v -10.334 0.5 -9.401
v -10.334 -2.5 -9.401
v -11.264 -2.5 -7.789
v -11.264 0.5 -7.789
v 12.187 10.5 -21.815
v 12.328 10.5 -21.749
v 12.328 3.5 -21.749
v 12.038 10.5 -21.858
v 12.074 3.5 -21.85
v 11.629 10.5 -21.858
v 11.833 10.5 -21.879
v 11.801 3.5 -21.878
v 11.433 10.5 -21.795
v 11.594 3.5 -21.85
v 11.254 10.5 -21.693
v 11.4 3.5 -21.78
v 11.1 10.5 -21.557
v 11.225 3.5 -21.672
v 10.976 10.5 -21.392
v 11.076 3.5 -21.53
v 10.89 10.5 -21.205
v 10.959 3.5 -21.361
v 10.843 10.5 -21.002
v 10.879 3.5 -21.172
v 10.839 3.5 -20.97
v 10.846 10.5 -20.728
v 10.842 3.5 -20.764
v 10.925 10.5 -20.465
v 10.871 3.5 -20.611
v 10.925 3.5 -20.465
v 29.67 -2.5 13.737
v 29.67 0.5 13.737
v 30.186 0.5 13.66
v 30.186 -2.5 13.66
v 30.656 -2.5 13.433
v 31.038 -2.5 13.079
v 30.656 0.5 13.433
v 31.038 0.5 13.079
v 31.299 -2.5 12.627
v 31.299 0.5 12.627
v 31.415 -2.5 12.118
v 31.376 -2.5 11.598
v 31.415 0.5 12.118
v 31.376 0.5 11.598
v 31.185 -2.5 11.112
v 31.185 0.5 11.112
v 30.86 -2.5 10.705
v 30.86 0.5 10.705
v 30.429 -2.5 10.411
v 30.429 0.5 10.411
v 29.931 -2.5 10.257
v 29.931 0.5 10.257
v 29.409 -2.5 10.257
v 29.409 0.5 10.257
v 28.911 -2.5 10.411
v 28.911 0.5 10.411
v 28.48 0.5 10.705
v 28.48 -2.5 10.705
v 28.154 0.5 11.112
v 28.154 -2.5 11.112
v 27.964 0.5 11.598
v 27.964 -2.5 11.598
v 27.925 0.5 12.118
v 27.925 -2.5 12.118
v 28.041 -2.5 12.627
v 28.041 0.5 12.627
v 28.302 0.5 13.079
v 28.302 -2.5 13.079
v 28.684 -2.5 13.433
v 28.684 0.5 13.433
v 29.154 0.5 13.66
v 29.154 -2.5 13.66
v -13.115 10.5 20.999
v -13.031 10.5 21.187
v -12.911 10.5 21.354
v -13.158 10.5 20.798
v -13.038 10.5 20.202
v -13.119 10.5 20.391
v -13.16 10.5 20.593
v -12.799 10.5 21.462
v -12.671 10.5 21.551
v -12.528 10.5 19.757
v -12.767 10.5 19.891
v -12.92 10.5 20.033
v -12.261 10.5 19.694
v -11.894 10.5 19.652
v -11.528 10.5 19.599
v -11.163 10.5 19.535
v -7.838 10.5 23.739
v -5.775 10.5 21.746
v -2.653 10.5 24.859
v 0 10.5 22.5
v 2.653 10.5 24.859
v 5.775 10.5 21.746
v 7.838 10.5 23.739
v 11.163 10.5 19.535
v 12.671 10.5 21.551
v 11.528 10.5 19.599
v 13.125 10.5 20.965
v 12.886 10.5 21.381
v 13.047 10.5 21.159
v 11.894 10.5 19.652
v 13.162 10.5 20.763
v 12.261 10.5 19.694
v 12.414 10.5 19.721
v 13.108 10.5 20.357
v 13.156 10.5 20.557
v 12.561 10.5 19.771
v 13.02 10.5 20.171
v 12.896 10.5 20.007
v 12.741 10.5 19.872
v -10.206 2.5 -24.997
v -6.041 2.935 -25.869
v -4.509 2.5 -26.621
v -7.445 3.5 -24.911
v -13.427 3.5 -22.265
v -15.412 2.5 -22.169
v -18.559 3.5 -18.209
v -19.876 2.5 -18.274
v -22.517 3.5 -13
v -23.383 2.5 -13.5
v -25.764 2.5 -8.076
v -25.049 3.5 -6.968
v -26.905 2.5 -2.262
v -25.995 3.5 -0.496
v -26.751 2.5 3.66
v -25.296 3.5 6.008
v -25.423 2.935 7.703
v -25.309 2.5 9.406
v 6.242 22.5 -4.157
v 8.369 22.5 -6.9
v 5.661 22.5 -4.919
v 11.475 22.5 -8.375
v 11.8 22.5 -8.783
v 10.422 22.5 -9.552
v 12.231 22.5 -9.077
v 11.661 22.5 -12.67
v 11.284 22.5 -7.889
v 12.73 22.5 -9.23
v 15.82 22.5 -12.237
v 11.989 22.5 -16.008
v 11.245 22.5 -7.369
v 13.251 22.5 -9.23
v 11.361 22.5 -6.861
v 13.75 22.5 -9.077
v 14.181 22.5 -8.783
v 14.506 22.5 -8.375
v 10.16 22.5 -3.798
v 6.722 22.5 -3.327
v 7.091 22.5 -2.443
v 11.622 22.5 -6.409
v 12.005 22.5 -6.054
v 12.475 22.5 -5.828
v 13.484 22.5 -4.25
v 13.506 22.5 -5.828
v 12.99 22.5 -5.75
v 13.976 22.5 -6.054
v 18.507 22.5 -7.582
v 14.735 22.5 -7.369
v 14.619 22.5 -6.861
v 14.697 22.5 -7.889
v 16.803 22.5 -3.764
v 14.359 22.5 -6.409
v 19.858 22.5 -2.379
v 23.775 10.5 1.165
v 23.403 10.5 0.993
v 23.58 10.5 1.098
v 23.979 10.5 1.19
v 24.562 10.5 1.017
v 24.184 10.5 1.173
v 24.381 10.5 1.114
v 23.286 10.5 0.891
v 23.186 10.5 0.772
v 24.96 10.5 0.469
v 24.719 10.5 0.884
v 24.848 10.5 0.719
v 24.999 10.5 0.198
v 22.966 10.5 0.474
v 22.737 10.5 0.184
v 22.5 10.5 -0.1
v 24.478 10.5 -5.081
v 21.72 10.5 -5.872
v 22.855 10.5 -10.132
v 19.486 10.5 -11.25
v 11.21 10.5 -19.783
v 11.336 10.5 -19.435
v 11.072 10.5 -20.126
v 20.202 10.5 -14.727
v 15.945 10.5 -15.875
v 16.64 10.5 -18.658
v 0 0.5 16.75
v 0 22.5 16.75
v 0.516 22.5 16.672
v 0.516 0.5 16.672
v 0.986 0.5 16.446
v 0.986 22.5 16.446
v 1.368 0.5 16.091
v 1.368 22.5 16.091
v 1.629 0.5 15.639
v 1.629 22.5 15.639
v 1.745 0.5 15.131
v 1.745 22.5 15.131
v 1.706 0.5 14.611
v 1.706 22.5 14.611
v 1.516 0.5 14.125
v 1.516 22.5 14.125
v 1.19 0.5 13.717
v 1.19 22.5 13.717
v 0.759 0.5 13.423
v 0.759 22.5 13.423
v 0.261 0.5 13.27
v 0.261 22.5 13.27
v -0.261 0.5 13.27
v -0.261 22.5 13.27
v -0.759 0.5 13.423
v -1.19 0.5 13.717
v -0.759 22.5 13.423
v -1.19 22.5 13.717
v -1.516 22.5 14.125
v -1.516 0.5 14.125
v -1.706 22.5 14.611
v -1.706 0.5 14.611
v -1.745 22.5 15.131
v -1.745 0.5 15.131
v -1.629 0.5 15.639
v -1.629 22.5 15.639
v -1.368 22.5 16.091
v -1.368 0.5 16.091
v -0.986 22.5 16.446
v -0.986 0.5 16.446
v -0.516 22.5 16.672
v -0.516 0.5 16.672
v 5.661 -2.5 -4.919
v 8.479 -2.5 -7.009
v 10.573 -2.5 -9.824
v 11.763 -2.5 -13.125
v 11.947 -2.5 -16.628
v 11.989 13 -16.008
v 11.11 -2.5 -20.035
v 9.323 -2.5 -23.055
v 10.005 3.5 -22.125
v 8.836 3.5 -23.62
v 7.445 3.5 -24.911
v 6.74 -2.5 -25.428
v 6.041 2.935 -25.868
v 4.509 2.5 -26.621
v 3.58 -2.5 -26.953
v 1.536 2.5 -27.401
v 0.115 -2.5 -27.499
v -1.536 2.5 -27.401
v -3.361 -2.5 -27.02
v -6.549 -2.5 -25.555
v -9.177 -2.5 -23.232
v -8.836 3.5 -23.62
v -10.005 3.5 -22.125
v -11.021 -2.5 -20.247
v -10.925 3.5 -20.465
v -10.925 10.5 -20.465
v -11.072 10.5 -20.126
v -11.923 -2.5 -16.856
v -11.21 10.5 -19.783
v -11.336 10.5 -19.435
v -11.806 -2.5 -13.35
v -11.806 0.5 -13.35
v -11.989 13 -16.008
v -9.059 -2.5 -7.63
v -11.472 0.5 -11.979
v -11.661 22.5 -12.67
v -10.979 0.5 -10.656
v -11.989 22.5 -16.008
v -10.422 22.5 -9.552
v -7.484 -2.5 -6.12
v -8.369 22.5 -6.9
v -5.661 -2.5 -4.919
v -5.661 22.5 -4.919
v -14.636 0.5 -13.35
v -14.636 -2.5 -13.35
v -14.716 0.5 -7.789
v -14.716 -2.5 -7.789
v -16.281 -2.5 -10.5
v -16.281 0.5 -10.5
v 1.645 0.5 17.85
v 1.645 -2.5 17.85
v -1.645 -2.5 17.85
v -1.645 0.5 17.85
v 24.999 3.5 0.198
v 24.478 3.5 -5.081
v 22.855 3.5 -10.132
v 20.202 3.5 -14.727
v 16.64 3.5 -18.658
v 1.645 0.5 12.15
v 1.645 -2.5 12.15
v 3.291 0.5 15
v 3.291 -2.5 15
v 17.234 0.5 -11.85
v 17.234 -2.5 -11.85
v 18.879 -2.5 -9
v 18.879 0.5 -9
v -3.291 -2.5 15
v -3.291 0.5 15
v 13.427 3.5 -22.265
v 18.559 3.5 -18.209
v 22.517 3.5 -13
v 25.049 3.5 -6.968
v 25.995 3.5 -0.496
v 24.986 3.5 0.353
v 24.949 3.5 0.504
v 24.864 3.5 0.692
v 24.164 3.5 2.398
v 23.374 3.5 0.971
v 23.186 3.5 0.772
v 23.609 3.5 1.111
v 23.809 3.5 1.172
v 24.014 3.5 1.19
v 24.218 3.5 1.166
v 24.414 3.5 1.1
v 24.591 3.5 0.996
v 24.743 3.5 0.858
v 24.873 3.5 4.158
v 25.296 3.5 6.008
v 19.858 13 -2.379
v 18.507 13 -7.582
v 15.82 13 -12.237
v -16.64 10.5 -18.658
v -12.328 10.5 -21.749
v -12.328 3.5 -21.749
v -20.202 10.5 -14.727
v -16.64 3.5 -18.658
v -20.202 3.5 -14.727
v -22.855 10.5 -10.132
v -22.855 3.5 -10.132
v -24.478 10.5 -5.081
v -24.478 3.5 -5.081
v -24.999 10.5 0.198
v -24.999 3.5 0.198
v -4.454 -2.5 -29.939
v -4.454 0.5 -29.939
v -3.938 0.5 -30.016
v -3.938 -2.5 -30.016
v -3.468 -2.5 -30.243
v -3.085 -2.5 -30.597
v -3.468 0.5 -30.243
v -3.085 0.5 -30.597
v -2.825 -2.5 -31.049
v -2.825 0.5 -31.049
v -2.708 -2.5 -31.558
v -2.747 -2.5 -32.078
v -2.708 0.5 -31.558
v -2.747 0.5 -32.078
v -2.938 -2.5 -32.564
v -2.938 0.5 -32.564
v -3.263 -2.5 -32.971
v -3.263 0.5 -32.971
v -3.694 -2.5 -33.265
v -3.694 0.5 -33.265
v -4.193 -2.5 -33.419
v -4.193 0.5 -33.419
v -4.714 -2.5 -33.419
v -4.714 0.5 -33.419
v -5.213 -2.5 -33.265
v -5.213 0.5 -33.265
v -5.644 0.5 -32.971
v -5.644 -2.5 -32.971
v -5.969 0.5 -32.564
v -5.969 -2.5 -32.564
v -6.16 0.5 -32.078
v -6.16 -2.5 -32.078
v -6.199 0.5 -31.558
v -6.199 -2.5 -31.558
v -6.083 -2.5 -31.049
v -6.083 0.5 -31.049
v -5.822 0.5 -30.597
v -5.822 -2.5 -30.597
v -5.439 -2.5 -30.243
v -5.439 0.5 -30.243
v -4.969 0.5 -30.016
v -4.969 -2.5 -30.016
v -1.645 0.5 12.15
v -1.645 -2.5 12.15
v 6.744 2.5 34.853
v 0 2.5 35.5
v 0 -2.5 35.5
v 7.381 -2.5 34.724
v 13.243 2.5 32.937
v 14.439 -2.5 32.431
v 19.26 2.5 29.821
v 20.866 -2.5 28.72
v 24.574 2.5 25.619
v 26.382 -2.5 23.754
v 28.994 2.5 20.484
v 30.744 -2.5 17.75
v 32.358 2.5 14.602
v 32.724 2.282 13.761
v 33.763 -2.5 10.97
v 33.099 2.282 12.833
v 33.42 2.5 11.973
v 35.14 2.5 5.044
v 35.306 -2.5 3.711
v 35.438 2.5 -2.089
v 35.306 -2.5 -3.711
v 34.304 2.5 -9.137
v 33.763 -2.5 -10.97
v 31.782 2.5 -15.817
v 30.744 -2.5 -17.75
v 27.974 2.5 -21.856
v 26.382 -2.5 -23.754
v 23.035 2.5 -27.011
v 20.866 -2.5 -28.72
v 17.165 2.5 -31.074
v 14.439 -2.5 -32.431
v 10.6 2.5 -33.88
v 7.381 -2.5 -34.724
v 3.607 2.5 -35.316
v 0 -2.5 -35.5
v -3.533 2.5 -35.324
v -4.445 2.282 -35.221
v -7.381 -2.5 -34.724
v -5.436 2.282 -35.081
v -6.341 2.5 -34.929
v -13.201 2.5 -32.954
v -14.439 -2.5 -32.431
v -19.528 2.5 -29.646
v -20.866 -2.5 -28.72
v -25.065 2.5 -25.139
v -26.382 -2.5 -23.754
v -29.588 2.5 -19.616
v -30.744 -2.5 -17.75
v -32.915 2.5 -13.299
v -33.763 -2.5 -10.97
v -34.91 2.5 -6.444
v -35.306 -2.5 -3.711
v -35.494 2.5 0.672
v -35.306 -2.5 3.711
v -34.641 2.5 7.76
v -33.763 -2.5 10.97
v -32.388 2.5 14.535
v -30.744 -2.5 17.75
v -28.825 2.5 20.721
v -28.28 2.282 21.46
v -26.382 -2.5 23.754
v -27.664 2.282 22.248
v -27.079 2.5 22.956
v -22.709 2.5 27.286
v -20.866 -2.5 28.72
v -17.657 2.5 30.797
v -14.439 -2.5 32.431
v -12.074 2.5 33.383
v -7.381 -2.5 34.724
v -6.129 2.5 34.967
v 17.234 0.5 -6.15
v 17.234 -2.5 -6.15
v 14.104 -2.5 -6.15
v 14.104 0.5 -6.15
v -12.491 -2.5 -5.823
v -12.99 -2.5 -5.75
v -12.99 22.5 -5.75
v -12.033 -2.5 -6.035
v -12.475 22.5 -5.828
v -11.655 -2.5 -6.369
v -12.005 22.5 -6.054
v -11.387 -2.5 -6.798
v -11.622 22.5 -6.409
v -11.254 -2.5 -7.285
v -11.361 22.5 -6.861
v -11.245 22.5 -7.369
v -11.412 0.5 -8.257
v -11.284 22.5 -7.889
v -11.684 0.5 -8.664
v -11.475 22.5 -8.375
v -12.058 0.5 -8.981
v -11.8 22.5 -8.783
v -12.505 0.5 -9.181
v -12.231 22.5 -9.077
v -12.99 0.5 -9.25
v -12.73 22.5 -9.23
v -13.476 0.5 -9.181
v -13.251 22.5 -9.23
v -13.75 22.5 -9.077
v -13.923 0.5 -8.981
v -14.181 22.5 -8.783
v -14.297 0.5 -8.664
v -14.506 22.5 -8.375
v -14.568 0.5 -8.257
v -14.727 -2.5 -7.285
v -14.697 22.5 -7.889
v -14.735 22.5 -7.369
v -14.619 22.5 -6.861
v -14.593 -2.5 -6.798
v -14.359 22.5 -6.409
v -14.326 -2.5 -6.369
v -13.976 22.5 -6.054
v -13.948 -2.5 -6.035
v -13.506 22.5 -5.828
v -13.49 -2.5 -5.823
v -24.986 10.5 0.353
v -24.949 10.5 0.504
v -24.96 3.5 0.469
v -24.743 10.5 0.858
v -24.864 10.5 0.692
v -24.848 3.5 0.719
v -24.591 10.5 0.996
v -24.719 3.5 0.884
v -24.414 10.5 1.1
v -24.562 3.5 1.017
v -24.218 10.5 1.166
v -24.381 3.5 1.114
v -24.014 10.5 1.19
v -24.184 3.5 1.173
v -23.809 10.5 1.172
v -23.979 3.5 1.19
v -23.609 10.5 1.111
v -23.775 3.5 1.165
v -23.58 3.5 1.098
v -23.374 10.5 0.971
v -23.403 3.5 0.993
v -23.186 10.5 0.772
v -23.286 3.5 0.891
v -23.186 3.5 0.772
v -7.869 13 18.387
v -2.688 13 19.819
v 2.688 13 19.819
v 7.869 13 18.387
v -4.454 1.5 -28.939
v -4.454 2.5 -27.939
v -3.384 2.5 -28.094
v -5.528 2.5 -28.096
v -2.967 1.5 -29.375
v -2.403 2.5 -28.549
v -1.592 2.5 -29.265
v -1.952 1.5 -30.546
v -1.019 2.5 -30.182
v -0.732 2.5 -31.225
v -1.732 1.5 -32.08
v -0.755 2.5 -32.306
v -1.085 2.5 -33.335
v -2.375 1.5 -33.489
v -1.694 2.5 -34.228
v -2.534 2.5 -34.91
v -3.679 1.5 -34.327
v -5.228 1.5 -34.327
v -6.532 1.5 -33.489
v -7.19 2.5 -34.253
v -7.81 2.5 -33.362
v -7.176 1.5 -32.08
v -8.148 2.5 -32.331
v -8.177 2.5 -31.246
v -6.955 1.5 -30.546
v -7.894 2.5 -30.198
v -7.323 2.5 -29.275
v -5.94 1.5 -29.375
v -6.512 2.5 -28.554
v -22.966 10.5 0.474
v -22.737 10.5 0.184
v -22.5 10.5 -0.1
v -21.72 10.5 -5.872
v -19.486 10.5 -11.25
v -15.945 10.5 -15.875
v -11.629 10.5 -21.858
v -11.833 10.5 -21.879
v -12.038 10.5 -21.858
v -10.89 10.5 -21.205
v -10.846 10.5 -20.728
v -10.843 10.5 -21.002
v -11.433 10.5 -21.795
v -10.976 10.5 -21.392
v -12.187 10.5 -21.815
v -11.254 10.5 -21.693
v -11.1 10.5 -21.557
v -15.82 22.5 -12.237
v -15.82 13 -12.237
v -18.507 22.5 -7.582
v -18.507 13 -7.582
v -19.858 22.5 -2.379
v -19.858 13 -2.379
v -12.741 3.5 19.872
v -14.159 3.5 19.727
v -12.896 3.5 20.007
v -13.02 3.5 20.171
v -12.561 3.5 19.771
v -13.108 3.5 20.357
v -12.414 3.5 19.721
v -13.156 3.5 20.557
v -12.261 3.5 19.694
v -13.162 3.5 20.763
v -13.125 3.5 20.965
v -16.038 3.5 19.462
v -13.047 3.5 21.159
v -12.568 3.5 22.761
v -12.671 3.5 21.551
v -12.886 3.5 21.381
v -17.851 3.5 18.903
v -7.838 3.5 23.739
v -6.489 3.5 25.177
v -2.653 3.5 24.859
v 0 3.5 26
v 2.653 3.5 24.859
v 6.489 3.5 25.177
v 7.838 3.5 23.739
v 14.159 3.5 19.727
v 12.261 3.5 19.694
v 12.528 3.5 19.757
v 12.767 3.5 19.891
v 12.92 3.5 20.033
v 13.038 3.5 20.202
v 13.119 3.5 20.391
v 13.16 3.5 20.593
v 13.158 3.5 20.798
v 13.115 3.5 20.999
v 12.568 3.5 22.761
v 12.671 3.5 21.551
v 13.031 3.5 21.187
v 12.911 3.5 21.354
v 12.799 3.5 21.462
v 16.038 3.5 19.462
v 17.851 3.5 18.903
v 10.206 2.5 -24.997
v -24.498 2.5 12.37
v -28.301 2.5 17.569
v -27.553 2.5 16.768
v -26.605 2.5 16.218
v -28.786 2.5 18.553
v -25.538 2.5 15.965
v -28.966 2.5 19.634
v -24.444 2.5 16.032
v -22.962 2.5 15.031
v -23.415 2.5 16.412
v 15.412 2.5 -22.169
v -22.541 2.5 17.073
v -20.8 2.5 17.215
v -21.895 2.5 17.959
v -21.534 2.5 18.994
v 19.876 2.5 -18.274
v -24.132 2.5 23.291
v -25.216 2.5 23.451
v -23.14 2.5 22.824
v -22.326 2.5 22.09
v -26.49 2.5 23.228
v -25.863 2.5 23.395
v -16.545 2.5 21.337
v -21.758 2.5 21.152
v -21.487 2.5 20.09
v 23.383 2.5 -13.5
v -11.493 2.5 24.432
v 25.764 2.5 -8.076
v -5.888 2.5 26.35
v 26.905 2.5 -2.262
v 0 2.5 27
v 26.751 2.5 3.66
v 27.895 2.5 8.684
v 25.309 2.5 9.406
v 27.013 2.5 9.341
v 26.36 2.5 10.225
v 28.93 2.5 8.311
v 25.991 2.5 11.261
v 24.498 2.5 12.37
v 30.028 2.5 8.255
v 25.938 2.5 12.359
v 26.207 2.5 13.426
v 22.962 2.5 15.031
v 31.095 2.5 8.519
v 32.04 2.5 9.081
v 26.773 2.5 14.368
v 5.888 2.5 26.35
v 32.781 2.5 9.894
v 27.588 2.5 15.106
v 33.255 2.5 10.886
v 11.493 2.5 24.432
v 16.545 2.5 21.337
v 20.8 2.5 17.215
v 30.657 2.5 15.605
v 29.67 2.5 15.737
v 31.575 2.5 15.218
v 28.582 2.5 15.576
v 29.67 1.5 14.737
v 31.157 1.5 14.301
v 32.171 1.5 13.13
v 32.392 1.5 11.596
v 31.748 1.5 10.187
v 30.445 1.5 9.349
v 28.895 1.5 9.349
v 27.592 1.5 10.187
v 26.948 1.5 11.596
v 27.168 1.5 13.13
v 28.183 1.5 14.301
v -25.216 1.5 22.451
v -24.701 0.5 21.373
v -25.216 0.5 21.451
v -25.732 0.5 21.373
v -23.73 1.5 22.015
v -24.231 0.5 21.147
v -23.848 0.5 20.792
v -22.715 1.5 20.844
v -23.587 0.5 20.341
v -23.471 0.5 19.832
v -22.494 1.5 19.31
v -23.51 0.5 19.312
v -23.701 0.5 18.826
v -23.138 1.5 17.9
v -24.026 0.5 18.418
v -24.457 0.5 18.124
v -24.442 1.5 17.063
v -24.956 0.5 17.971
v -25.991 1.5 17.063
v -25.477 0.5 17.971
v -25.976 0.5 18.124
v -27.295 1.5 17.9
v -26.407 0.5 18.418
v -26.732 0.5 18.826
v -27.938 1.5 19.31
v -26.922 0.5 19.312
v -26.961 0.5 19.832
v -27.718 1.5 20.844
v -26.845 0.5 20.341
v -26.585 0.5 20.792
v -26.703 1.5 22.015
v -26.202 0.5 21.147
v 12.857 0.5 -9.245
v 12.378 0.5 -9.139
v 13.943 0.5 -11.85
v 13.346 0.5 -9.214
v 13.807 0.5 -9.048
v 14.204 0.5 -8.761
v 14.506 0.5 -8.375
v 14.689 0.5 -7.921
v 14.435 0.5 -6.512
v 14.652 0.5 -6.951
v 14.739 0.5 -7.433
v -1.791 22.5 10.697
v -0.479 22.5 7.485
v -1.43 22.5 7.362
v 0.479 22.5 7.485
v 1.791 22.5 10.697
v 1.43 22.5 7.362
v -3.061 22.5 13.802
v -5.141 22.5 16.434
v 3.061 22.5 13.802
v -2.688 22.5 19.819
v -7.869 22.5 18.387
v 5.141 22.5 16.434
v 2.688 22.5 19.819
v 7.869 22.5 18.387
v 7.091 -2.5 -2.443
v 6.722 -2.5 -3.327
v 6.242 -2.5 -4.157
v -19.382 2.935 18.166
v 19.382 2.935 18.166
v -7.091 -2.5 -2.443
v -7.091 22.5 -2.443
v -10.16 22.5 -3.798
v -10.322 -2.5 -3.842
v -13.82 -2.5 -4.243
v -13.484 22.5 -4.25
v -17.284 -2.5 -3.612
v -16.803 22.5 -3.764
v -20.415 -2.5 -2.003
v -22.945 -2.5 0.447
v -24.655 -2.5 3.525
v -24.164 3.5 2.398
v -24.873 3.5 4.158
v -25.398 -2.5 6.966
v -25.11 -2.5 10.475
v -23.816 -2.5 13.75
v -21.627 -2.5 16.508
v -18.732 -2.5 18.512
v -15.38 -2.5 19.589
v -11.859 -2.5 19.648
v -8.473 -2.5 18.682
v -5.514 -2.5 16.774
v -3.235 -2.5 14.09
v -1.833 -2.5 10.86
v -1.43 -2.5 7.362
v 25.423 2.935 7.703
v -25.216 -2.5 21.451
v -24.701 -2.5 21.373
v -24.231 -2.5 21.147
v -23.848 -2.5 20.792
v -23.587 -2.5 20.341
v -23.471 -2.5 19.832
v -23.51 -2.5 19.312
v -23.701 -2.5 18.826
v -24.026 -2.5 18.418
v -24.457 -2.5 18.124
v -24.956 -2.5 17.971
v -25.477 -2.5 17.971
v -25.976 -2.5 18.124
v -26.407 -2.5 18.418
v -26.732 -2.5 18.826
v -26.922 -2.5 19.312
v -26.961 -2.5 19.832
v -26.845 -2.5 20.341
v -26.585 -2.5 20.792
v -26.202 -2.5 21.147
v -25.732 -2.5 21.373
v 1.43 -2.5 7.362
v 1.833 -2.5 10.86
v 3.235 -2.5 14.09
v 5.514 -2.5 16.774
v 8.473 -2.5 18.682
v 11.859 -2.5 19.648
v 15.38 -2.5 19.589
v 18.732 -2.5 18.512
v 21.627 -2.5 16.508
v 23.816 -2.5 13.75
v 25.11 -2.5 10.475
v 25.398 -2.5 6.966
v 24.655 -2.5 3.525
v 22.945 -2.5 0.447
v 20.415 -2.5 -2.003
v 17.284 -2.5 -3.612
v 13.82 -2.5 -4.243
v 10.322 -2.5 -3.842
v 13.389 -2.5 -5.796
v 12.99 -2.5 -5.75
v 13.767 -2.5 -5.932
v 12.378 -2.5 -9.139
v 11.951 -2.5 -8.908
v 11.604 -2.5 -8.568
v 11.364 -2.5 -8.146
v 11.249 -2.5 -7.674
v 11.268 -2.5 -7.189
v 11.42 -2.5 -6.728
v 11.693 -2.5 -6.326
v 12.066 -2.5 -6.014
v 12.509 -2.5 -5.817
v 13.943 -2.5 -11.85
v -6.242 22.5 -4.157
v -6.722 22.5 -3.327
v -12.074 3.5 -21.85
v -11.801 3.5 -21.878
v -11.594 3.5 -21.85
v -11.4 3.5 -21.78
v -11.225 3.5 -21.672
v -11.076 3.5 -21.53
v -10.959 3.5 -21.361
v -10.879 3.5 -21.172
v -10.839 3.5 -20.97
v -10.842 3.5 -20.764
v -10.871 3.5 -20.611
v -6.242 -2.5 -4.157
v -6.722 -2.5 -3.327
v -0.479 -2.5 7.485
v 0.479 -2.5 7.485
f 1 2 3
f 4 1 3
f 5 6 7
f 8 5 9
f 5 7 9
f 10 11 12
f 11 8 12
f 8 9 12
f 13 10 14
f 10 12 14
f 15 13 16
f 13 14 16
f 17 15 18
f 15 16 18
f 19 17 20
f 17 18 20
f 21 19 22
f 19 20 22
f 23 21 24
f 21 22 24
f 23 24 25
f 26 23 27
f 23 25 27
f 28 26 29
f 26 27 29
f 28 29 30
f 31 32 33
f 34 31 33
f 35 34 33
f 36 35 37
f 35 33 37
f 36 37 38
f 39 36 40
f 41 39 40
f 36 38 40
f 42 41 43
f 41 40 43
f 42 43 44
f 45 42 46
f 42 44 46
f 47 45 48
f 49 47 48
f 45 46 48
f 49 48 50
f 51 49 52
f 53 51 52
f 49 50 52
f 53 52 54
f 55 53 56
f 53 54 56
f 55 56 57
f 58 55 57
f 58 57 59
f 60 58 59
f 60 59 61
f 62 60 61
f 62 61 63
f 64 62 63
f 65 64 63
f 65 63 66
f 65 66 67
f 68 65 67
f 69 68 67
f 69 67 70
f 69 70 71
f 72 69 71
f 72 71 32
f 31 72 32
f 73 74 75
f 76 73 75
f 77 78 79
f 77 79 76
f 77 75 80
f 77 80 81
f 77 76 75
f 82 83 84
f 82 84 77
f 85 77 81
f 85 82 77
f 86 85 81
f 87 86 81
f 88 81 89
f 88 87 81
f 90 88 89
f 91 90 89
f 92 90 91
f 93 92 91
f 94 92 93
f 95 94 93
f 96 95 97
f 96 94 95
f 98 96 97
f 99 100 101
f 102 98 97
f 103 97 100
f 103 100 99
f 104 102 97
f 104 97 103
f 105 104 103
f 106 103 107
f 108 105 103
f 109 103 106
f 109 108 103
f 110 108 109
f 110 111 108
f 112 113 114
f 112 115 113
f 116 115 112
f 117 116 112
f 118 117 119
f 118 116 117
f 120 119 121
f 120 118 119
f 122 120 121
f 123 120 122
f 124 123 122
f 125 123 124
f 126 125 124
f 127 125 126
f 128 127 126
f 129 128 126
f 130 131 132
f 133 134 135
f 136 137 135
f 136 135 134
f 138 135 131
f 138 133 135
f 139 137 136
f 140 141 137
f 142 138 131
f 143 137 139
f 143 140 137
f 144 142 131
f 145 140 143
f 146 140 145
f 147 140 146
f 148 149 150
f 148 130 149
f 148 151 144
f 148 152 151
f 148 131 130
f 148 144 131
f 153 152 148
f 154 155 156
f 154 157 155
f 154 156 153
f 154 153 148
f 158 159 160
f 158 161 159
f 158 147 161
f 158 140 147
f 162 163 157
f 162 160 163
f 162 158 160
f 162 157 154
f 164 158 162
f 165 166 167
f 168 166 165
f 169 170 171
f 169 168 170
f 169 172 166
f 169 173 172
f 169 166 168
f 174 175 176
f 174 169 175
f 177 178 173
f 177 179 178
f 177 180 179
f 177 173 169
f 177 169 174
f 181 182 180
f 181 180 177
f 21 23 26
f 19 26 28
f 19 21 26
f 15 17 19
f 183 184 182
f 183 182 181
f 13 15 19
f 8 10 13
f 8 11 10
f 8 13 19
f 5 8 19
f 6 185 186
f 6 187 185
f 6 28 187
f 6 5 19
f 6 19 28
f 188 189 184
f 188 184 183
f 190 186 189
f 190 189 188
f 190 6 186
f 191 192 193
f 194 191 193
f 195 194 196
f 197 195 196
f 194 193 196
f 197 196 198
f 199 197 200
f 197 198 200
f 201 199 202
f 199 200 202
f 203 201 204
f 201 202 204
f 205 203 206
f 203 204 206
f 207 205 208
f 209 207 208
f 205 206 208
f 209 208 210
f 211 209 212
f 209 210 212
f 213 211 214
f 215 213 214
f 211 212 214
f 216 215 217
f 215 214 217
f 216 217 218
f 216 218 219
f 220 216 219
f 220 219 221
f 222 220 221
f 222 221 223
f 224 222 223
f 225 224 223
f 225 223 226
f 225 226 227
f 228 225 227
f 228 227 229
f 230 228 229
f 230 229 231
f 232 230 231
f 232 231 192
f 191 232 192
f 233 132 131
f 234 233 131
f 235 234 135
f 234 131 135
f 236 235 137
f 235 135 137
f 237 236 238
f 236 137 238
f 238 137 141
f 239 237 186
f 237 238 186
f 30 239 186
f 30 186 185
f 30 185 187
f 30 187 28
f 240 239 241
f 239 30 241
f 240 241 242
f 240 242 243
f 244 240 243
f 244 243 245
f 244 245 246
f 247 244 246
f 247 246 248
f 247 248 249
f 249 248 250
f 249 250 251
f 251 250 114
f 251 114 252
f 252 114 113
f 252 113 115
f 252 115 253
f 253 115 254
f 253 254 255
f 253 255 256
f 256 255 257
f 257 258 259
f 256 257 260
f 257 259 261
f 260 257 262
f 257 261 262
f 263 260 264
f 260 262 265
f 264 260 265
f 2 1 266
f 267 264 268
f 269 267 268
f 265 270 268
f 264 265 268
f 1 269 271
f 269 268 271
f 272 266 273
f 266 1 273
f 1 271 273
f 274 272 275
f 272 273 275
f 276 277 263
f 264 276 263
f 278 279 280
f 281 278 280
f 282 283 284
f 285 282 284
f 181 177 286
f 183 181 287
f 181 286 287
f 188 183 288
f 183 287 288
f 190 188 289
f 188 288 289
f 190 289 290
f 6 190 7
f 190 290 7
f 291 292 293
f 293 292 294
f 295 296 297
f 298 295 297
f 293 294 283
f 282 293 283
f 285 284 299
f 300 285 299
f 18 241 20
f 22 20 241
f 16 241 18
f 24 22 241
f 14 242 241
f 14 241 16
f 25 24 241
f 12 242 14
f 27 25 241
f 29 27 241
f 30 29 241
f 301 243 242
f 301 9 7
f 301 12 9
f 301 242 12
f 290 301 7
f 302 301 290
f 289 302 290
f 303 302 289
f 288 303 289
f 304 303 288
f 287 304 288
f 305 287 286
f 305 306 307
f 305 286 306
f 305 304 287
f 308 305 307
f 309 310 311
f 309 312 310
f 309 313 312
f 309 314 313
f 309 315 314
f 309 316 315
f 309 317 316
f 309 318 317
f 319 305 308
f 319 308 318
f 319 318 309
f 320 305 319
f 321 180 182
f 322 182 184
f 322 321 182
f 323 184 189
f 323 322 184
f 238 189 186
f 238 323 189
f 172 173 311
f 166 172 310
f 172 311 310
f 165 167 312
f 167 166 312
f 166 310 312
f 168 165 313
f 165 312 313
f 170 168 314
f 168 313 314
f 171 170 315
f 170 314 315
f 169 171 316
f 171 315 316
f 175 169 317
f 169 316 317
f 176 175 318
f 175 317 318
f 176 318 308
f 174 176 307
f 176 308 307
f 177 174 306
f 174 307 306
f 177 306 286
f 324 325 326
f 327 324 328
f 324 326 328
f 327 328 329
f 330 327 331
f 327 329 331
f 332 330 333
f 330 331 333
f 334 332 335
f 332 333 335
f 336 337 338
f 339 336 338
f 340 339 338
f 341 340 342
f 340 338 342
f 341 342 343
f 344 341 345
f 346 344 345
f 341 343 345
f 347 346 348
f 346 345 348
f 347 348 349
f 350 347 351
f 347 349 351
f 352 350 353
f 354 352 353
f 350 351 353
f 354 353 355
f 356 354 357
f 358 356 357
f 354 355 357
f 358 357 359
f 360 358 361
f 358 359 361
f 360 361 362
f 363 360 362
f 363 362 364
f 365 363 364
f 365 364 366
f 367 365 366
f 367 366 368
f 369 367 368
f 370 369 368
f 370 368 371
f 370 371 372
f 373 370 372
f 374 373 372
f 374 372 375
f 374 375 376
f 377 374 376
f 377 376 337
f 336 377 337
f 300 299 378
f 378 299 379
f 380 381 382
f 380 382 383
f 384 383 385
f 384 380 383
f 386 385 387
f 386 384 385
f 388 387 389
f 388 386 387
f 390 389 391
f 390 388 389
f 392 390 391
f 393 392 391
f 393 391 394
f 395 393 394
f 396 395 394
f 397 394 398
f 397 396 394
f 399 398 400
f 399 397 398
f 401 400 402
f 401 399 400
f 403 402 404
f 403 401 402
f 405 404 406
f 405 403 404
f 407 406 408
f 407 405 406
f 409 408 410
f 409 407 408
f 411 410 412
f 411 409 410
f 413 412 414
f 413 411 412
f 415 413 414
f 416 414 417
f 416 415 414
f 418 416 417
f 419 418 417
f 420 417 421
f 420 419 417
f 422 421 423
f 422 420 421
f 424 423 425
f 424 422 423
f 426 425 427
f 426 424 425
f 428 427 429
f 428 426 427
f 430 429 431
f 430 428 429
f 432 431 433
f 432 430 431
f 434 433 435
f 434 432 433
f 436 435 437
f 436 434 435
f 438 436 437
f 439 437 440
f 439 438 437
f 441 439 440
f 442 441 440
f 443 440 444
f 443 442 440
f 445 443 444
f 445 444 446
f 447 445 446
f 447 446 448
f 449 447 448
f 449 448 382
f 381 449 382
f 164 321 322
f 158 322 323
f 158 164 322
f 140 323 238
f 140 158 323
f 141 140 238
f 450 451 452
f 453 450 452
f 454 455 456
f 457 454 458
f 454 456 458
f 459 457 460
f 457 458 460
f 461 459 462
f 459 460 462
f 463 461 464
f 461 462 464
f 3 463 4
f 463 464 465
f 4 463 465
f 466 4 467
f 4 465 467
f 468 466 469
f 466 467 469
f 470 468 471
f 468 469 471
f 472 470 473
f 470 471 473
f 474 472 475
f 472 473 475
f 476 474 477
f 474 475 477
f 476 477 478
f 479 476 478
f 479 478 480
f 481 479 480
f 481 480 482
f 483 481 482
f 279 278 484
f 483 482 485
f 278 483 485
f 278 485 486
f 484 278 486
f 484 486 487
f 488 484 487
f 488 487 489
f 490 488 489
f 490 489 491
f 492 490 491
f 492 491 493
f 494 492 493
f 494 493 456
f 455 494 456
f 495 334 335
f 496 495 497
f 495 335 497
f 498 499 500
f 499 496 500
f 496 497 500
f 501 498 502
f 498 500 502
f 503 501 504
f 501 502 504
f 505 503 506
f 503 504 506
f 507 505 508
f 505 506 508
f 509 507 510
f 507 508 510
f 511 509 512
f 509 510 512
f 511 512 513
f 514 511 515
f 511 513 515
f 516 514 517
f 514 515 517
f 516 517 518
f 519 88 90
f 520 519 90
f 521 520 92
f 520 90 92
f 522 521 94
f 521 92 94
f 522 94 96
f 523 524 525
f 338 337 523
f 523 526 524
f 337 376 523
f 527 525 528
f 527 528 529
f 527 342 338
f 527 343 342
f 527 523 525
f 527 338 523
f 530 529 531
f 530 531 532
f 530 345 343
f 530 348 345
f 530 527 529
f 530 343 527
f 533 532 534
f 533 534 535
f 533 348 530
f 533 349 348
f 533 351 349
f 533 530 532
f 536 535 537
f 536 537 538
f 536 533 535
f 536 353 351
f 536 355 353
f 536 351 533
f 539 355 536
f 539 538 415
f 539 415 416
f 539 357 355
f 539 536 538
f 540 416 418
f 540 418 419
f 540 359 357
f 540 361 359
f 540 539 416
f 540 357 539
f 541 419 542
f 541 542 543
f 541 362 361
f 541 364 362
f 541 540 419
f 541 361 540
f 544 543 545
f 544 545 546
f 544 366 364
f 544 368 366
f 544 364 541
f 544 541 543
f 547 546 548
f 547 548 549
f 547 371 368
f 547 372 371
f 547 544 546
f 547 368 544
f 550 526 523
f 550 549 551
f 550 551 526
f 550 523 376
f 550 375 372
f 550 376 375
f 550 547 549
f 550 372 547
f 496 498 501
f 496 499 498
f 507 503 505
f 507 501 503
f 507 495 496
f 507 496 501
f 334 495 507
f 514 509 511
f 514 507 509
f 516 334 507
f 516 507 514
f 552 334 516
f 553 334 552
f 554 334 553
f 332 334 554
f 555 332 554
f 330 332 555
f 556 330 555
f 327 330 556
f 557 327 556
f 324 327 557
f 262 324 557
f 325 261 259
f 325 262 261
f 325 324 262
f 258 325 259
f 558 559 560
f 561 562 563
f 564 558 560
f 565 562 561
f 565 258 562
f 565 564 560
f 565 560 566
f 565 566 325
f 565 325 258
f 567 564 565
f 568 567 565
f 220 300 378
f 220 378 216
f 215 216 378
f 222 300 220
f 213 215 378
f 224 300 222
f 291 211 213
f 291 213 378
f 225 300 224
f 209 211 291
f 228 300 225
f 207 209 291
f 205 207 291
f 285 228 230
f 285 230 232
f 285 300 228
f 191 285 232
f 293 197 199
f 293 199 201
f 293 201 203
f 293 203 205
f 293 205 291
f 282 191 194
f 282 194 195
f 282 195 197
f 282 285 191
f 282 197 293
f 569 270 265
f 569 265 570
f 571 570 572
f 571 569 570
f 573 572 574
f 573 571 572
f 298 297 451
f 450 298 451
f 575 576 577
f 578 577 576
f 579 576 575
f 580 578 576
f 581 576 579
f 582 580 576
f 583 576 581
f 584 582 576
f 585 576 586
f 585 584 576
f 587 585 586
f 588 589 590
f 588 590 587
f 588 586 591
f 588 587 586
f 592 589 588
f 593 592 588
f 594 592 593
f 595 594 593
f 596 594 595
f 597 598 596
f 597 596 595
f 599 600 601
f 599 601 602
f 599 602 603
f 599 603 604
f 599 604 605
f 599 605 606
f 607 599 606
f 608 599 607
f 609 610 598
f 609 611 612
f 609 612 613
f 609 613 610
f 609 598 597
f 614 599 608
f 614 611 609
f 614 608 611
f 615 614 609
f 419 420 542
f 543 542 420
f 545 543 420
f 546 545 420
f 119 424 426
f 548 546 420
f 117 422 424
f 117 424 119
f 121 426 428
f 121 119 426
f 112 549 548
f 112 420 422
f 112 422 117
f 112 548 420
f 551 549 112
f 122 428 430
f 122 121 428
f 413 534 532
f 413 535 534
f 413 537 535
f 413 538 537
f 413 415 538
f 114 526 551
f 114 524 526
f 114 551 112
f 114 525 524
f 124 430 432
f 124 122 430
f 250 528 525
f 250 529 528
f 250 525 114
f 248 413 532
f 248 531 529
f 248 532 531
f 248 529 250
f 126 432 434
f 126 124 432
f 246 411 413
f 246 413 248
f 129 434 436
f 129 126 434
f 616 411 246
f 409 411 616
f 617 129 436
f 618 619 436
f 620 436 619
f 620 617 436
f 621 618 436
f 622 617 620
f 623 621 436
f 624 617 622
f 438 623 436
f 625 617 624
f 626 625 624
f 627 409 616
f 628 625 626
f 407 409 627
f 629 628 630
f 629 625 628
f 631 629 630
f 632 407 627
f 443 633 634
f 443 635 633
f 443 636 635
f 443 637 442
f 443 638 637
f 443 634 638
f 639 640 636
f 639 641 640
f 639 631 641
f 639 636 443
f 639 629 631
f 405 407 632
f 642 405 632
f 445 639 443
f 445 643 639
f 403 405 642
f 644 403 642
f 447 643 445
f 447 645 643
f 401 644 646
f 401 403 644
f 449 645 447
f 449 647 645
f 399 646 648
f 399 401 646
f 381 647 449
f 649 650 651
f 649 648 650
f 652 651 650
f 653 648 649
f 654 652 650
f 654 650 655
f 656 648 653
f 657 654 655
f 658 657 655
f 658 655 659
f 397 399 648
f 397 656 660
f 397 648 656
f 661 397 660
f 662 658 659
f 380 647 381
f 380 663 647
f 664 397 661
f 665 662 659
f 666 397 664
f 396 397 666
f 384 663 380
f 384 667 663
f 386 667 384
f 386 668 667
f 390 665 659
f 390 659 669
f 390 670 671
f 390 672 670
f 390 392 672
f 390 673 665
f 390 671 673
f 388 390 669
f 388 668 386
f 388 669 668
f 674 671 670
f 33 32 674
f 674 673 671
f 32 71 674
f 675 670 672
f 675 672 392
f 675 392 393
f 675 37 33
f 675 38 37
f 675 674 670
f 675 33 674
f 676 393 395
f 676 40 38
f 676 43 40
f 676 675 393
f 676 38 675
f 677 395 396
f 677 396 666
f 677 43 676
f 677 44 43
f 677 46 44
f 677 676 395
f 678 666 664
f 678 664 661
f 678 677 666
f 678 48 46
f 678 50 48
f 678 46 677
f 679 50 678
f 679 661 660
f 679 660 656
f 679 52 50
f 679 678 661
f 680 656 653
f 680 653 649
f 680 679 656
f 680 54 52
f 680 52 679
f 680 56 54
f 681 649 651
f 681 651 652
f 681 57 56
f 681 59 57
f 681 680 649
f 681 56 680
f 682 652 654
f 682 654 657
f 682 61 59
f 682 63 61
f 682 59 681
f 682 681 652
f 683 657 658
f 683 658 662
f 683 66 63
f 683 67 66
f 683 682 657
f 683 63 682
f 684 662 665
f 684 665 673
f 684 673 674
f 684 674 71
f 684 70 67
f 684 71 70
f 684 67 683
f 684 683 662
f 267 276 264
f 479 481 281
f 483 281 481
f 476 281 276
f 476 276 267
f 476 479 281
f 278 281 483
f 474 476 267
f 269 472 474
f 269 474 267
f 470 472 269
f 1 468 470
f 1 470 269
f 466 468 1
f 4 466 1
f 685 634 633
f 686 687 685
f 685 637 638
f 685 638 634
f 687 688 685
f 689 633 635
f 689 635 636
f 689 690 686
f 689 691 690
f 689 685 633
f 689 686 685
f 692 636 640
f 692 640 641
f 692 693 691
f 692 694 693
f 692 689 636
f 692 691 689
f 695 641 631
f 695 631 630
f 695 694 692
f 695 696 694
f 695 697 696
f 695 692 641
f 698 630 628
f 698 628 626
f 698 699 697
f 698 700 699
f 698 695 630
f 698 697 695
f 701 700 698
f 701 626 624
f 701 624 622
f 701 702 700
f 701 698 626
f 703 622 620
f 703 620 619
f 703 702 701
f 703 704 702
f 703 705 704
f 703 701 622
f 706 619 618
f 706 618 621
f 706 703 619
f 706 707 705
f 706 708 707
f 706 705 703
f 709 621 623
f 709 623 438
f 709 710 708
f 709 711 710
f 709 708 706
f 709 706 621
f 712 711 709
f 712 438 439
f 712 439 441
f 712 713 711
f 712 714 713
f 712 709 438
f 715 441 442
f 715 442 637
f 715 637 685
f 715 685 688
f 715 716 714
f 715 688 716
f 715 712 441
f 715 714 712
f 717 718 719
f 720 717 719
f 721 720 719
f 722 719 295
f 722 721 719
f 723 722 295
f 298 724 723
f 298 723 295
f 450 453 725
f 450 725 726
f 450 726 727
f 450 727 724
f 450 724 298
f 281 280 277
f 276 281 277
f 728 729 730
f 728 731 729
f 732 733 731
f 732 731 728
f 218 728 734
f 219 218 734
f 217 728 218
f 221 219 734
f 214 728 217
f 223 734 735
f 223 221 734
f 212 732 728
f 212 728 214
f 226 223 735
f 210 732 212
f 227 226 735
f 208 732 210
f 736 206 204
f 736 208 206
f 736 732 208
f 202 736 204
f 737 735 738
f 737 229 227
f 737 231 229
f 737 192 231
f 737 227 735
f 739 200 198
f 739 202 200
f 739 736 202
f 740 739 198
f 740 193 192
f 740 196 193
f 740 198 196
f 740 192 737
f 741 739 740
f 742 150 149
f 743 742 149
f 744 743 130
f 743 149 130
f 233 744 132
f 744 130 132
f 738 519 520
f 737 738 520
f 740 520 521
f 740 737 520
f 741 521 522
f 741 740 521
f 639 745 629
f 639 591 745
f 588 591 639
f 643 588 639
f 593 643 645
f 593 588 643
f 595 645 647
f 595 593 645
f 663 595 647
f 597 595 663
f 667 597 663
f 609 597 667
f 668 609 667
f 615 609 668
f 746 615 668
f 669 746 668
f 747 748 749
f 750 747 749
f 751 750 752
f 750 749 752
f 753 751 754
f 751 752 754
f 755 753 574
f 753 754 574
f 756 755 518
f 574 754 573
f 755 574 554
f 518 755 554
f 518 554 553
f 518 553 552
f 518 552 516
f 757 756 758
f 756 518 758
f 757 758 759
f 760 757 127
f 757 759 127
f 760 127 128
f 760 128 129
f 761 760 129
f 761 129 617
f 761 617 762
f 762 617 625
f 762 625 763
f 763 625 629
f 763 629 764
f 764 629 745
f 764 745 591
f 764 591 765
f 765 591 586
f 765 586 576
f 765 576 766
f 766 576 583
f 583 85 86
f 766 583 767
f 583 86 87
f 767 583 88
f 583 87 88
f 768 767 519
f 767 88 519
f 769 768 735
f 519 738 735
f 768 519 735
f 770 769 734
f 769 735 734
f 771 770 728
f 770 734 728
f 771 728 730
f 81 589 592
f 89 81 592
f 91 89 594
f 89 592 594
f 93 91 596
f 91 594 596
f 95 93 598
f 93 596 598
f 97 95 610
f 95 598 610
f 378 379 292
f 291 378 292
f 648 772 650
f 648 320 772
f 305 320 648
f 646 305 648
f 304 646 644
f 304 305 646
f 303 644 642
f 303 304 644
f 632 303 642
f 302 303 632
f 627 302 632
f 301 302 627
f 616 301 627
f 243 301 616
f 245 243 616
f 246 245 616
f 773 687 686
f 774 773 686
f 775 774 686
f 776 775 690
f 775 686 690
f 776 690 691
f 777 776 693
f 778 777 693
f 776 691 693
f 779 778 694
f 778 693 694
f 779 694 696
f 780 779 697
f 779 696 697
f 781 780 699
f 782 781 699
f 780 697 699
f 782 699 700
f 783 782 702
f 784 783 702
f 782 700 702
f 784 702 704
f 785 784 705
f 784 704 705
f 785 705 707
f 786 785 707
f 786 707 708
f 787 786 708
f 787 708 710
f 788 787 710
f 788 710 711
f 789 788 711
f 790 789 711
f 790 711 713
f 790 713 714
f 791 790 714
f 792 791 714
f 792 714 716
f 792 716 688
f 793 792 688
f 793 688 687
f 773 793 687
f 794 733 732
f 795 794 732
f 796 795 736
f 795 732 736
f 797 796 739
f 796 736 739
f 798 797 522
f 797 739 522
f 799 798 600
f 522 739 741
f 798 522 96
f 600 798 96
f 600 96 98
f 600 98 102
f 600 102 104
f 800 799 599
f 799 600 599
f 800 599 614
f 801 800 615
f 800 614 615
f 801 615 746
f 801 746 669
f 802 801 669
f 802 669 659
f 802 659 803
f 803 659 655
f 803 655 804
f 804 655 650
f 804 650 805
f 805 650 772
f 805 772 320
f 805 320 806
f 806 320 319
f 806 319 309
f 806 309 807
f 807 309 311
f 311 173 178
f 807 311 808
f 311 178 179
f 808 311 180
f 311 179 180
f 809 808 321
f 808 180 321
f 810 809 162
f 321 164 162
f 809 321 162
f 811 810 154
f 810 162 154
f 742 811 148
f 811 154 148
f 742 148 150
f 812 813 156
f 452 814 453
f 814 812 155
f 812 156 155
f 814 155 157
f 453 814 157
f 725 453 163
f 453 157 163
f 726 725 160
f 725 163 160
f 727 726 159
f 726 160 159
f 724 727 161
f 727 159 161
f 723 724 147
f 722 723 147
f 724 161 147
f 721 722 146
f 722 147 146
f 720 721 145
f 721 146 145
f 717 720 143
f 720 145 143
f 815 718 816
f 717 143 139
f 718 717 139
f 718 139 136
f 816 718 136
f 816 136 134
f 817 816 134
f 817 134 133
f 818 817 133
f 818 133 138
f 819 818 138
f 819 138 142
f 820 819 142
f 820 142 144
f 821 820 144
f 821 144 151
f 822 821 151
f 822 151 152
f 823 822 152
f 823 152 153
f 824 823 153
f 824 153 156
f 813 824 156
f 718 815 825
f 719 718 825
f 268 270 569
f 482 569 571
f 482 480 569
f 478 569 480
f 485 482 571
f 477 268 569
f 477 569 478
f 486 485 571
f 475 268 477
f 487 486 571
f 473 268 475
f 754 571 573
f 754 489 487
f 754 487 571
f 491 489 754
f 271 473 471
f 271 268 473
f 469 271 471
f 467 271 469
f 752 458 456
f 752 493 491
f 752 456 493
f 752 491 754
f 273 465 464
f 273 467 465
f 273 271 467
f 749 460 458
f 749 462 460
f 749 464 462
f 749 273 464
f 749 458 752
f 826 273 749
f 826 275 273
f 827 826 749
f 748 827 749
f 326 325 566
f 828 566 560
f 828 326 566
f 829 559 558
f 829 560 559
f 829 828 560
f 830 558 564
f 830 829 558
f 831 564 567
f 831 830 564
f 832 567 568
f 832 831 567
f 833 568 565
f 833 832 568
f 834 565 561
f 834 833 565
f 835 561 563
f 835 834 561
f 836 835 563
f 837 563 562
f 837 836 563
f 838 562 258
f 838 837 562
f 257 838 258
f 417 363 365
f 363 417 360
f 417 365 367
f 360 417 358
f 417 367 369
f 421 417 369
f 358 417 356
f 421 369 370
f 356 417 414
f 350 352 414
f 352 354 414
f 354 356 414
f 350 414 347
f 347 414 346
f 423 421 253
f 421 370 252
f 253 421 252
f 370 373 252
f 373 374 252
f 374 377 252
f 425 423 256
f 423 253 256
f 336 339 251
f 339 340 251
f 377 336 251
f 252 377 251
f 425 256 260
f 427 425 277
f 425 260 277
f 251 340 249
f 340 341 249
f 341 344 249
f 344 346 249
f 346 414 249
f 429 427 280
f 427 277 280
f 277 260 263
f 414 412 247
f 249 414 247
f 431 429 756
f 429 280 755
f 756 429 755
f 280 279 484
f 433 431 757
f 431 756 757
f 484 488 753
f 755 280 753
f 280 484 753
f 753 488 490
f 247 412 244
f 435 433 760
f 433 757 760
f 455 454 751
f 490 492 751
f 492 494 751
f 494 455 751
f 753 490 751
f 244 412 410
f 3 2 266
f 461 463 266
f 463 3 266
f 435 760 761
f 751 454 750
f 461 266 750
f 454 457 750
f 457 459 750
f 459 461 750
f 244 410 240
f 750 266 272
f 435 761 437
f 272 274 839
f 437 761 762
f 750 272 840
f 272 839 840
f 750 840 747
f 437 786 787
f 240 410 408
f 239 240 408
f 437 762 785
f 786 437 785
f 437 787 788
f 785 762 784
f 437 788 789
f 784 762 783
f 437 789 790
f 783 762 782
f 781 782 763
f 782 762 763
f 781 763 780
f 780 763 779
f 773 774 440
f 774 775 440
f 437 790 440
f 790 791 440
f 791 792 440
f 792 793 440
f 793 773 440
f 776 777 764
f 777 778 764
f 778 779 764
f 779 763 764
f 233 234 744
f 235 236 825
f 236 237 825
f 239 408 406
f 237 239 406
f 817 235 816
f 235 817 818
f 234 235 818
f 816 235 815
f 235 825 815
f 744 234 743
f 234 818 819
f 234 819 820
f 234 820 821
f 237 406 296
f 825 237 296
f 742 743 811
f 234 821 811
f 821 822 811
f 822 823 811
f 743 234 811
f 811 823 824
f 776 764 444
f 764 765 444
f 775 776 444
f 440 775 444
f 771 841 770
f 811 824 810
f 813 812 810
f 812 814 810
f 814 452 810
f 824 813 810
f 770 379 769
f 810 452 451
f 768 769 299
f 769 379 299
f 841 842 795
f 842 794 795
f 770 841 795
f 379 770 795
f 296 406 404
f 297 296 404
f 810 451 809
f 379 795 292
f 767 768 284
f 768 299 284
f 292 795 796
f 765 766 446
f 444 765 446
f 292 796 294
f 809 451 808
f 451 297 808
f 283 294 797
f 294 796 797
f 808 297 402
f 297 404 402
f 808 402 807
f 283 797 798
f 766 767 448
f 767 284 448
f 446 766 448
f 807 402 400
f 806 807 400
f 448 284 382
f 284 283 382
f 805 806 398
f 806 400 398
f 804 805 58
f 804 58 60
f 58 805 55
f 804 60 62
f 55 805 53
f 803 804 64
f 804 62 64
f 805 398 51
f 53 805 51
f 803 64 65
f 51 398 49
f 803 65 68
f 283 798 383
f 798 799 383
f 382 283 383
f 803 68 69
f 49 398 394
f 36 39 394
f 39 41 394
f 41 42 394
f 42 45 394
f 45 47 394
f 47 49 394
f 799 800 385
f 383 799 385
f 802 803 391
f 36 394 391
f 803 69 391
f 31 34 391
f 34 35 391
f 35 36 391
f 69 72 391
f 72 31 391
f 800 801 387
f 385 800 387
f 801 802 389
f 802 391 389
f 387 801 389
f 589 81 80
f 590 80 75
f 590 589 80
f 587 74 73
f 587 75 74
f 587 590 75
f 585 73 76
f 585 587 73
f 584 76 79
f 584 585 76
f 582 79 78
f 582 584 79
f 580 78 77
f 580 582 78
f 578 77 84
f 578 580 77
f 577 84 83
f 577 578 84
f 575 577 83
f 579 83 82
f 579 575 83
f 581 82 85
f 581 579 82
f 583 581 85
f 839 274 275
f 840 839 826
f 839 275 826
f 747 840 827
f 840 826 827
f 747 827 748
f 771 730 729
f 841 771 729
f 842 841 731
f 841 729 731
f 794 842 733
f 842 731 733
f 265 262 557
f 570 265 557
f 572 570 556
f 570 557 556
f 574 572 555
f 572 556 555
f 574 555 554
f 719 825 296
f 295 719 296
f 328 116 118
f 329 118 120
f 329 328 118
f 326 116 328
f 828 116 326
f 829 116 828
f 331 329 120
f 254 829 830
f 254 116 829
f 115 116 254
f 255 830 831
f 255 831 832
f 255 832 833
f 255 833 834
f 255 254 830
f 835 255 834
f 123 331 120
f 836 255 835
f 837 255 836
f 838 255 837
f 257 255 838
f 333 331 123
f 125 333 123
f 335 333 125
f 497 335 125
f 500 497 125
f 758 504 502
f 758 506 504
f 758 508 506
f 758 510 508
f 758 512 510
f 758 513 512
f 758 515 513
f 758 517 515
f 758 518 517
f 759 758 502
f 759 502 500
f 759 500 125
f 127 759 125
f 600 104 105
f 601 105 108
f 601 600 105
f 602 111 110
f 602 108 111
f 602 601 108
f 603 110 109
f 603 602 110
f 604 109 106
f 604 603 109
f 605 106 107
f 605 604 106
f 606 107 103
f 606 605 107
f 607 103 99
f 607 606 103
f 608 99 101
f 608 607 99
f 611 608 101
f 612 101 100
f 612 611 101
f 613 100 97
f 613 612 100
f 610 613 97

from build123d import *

# Parameters (mm, degrees)
SKETCH1_R           = 35.5
BOSS_EXTRUDE1_DEPTH = 2.5
SKETCH2_R           = 26
BOSS_EXTRUDE2_DEPTH = 1
SKETCH3_R           = 25
BOSS_EXTRUDE3_DEPTH = 19
CHAMFER1_SIZE       = 1
SKETCH4_R           = 12
CUT_EXTRUDE1_DEPTH  = 57.084757288
SKETCH5_R           = 7.5
CUT_EXTRUDE2_DEPTH  = 57.084757332
FILLET1_R           = 1
SKETCH6_R           = 30.018937713
SKETCH6_R_2         = 20
CUT_EXTRUDE3_DEPTH  = 12
CHAMFER2_SIZE       = 2.5
SKETCH7_R           = 1.75
CUT_EXTRUDE4_DEPTH  = 57.084757332
CUT_EXTRUDE5_DEPTH  = 3
SKETCH9_R           = 1.75
CUT_EXTRUDE6_DEPTH  = 55.041650641
CHAMFER3_SIZE       = 2


# Some blends are built 0.0001 mm under size
with BuildPart() as part:
    # Sketch1 → Boss-Extrude1 (new, symmetric)
    with BuildSketch(Plane(origin=(0, 0, 0), x_dir=(1, 0, 0), z_dir=(0, 1, 0))):
        with Locations(Location((0, 0, 0), (0, 0, 270))):
            Circle(SKETCH1_R)
    extrude(amount=BOSS_EXTRUDE1_DEPTH, both=True)

    # Sketch2 → Boss-Extrude2 (add)
    with BuildSketch(Plane(origin=(0, 2.5, 0), x_dir=(1, 0, 0), z_dir=(0, 1, 0))):
        with Locations(Location((0, 0, 0), (0, 0, 270))):
            Circle(SKETCH2_R)
    extrude(amount=BOSS_EXTRUDE2_DEPTH)

    # Sketch3 → Boss-Extrude3 (add)
    with BuildSketch(Plane(origin=(0, 3.5, 0), x_dir=(1, 0, 0), z_dir=(0, 1, 0))):
        with Locations(Location((0, 0, 0), (0, 0, 270))):
            Circle(SKETCH3_R)
    extrude(amount=BOSS_EXTRUDE3_DEPTH)

    # Chamfer1
    chamfer1_edges = [part.edges().sort_by_distance(p)[0] for p in [
        (0, 2.5, -26),
    ]]
    chamfer(chamfer1_edges, length=CHAMFER1_SIZE - 0.0001)  # a hair under: the kernel refuses the full size

    # Sketch4 → Cut-Extrude1 (cut, through all)
    with BuildSketch(Plane(origin=(0, 22.5, 0), x_dir=(1, 0, 0), z_dir=(0, 1, 0))):
        with Locations(Location((0, 15.5, 0), (0, 0, 270))):
            Circle(SKETCH4_R)
        with Locations(Location((13.423393759, -7.75, 0), (0, 0, 270))):
            Circle(SKETCH4_R)
        with Locations(Location((-13.423393759, -7.75, 0), (0, 0, 270))):
            Circle(SKETCH4_R)
    extrude(amount=-CUT_EXTRUDE1_DEPTH, mode=Mode.SUBTRACT)

    # Sketch5 → Cut-Extrude2 (cut, through all)
    with BuildSketch(Plane(origin=(0, 22.5, 0), x_dir=(1, 0, 0), z_dir=(0, 1, 0))):
        Circle(SKETCH5_R)
    extrude(amount=-CUT_EXTRUDE2_DEPTH, mode=Mode.SUBTRACT)

    # Fillet1
    fillet1_edges = [part.edges().sort_by_distance(p)[0] for p in [
        (-15.575022283, 13, 19.555528141),
        (-24.723095296, 13, 3.710600891),
        (24.723095296, 13, 3.710600891),
        (15.575022283, 13, 19.555528141),
        (-9.148073013, 13, -23.266129032),
        (9.148073013, 13, -23.266129032),
    ]]
    fillet(fillet1_edges, radius=FILLET1_R)

    # Sketch6 → Cut-Extrude3 (cut)
    with BuildSketch(Plane(origin=(0, 22.5, 0), x_dir=(1, 0, 0), z_dir=(0, 1, 0))):
        Circle(SKETCH6_R)
        Circle(SKETCH6_R_2, mode=Mode.SUBTRACT)
    extrude(amount=-CUT_EXTRUDE3_DEPTH, mode=Mode.SUBTRACT)

    # Chamfer2
    chamfer2_edges = [part.edges().sort_by_distance(p)[0] for p in [
        (17.320508076, 10.5, -10),
        (-17.320508076, 10.5, -10),
        (0, 10.5, 20),
    ]]
    chamfer(chamfer2_edges, length=CHAMFER2_SIZE)

    # Sketch7 → Cut-Extrude4 (cut, through all)
    with BuildSketch(Plane(origin=(0, 22.5, 0), x_dir=(1, 0, 0), z_dir=(0, 1, 0))):
        with Locations(Location((0, -15, 0), (0, 0, 270))):
            Circle(SKETCH7_R)
        with Locations(Location((-12.990381057, 7.5, 0), (0, 0, 270))):
            Circle(SKETCH7_R)
        with Locations(Location((12.990381057, 7.5, 0), (0, 0, 270))):
            Circle(SKETCH7_R)
    extrude(amount=-CUT_EXTRUDE4_DEPTH, mode=Mode.SUBTRACT)

    # Sketch8 → Cut-Extrude5 (cut)
    with BuildSketch(Plane.XZ.offset(2.5)):
        Polygon((18.879353803, -9), (17.233905535, -6.15), (13.943009001, -6.15), (12.297560734, -9), (13.943009001, -11.85), (17.233905535, -11.85), align=None)
        Polygon((-1.645448267, 17.85), (-3.290896534, 15), (-1.645448267, 12.15), (1.645448267, 12.15), (3.290896534, 15), (1.645448267, 17.85), align=None)
        Polygon((-14.635829324, -13.35), (-11.34493279, -13.35), (-9.699484522, -10.5), (-11.34493279, -7.65), (-14.635829324, -7.65), (-16.281277591, -10.5), align=None)
    extrude(amount=-CUT_EXTRUDE5_DEPTH, mode=Mode.SUBTRACT)

    # Sketch9 → Cut-Extrude6 (cut, through all)
    with BuildSketch(Plane(origin=(0, 2.5, 0), x_dir=(1, 0, 0), z_dir=(0, 1, 0))):
        with Locations(Location((-4.453539231, 31.6885782, 0), (0, 0, 270))):
            Circle(SKETCH9_R)
        with Locations(Location((29.669883346, -11.987410989, 0), (0, 0, 270))):
            Circle(SKETCH9_R)
        with Locations(Location((-25.216344115, -19.70116721, 0), (0, 0, 270))):
            Circle(SKETCH9_R)
    extrude(amount=-CUT_EXTRUDE6_DEPTH, mode=Mode.SUBTRACT)

    # Chamfer3
    # the kernel refuses this chamfer: 2 mm, written as the material it takes off along each edge
    with BuildSketch(Plane(origin=(-4.453539231, 2.5, -31.6885782), x_dir=(0, 0, 1), z_dir=(-1, 0, 0))) as chamfer3_piece_1:
        Polygon((1.75 + CHAMFER3_SIZE, 0), (1.75, -CHAMFER3_SIZE), (1.75, 0), align=None)
    revolve(axis=Axis((-4.453539231, 2.5, -31.6885782), (0, 1, 0)), mode=Mode.SUBTRACT)
    with BuildSketch(Plane(origin=(29.669883346, 2.5, 11.987410989), x_dir=(0, 0, 1), z_dir=(-1, 0, 0))) as chamfer3_piece_2:
        Polygon((1.75 + CHAMFER3_SIZE, 0), (1.75, -CHAMFER3_SIZE), (1.75, 0), align=None)
    revolve(axis=Axis((29.669883346, 2.5, 11.987410989), (0, 1, 0)), mode=Mode.SUBTRACT)
    with BuildSketch(Plane(origin=(-25.216344115, 2.5, 19.70116721), x_dir=(0, 0, 1), z_dir=(-1, 0, 0))) as chamfer3_piece_3:
        Polygon((1.75 + CHAMFER3_SIZE, 0), (1.75, -CHAMFER3_SIZE), (1.75, 0), align=None)
    revolve(axis=Axis((-25.216344115, 2.5, 19.70116721), (0, 1, 0)), mode=Mode.SUBTRACT)


solid = part.part
